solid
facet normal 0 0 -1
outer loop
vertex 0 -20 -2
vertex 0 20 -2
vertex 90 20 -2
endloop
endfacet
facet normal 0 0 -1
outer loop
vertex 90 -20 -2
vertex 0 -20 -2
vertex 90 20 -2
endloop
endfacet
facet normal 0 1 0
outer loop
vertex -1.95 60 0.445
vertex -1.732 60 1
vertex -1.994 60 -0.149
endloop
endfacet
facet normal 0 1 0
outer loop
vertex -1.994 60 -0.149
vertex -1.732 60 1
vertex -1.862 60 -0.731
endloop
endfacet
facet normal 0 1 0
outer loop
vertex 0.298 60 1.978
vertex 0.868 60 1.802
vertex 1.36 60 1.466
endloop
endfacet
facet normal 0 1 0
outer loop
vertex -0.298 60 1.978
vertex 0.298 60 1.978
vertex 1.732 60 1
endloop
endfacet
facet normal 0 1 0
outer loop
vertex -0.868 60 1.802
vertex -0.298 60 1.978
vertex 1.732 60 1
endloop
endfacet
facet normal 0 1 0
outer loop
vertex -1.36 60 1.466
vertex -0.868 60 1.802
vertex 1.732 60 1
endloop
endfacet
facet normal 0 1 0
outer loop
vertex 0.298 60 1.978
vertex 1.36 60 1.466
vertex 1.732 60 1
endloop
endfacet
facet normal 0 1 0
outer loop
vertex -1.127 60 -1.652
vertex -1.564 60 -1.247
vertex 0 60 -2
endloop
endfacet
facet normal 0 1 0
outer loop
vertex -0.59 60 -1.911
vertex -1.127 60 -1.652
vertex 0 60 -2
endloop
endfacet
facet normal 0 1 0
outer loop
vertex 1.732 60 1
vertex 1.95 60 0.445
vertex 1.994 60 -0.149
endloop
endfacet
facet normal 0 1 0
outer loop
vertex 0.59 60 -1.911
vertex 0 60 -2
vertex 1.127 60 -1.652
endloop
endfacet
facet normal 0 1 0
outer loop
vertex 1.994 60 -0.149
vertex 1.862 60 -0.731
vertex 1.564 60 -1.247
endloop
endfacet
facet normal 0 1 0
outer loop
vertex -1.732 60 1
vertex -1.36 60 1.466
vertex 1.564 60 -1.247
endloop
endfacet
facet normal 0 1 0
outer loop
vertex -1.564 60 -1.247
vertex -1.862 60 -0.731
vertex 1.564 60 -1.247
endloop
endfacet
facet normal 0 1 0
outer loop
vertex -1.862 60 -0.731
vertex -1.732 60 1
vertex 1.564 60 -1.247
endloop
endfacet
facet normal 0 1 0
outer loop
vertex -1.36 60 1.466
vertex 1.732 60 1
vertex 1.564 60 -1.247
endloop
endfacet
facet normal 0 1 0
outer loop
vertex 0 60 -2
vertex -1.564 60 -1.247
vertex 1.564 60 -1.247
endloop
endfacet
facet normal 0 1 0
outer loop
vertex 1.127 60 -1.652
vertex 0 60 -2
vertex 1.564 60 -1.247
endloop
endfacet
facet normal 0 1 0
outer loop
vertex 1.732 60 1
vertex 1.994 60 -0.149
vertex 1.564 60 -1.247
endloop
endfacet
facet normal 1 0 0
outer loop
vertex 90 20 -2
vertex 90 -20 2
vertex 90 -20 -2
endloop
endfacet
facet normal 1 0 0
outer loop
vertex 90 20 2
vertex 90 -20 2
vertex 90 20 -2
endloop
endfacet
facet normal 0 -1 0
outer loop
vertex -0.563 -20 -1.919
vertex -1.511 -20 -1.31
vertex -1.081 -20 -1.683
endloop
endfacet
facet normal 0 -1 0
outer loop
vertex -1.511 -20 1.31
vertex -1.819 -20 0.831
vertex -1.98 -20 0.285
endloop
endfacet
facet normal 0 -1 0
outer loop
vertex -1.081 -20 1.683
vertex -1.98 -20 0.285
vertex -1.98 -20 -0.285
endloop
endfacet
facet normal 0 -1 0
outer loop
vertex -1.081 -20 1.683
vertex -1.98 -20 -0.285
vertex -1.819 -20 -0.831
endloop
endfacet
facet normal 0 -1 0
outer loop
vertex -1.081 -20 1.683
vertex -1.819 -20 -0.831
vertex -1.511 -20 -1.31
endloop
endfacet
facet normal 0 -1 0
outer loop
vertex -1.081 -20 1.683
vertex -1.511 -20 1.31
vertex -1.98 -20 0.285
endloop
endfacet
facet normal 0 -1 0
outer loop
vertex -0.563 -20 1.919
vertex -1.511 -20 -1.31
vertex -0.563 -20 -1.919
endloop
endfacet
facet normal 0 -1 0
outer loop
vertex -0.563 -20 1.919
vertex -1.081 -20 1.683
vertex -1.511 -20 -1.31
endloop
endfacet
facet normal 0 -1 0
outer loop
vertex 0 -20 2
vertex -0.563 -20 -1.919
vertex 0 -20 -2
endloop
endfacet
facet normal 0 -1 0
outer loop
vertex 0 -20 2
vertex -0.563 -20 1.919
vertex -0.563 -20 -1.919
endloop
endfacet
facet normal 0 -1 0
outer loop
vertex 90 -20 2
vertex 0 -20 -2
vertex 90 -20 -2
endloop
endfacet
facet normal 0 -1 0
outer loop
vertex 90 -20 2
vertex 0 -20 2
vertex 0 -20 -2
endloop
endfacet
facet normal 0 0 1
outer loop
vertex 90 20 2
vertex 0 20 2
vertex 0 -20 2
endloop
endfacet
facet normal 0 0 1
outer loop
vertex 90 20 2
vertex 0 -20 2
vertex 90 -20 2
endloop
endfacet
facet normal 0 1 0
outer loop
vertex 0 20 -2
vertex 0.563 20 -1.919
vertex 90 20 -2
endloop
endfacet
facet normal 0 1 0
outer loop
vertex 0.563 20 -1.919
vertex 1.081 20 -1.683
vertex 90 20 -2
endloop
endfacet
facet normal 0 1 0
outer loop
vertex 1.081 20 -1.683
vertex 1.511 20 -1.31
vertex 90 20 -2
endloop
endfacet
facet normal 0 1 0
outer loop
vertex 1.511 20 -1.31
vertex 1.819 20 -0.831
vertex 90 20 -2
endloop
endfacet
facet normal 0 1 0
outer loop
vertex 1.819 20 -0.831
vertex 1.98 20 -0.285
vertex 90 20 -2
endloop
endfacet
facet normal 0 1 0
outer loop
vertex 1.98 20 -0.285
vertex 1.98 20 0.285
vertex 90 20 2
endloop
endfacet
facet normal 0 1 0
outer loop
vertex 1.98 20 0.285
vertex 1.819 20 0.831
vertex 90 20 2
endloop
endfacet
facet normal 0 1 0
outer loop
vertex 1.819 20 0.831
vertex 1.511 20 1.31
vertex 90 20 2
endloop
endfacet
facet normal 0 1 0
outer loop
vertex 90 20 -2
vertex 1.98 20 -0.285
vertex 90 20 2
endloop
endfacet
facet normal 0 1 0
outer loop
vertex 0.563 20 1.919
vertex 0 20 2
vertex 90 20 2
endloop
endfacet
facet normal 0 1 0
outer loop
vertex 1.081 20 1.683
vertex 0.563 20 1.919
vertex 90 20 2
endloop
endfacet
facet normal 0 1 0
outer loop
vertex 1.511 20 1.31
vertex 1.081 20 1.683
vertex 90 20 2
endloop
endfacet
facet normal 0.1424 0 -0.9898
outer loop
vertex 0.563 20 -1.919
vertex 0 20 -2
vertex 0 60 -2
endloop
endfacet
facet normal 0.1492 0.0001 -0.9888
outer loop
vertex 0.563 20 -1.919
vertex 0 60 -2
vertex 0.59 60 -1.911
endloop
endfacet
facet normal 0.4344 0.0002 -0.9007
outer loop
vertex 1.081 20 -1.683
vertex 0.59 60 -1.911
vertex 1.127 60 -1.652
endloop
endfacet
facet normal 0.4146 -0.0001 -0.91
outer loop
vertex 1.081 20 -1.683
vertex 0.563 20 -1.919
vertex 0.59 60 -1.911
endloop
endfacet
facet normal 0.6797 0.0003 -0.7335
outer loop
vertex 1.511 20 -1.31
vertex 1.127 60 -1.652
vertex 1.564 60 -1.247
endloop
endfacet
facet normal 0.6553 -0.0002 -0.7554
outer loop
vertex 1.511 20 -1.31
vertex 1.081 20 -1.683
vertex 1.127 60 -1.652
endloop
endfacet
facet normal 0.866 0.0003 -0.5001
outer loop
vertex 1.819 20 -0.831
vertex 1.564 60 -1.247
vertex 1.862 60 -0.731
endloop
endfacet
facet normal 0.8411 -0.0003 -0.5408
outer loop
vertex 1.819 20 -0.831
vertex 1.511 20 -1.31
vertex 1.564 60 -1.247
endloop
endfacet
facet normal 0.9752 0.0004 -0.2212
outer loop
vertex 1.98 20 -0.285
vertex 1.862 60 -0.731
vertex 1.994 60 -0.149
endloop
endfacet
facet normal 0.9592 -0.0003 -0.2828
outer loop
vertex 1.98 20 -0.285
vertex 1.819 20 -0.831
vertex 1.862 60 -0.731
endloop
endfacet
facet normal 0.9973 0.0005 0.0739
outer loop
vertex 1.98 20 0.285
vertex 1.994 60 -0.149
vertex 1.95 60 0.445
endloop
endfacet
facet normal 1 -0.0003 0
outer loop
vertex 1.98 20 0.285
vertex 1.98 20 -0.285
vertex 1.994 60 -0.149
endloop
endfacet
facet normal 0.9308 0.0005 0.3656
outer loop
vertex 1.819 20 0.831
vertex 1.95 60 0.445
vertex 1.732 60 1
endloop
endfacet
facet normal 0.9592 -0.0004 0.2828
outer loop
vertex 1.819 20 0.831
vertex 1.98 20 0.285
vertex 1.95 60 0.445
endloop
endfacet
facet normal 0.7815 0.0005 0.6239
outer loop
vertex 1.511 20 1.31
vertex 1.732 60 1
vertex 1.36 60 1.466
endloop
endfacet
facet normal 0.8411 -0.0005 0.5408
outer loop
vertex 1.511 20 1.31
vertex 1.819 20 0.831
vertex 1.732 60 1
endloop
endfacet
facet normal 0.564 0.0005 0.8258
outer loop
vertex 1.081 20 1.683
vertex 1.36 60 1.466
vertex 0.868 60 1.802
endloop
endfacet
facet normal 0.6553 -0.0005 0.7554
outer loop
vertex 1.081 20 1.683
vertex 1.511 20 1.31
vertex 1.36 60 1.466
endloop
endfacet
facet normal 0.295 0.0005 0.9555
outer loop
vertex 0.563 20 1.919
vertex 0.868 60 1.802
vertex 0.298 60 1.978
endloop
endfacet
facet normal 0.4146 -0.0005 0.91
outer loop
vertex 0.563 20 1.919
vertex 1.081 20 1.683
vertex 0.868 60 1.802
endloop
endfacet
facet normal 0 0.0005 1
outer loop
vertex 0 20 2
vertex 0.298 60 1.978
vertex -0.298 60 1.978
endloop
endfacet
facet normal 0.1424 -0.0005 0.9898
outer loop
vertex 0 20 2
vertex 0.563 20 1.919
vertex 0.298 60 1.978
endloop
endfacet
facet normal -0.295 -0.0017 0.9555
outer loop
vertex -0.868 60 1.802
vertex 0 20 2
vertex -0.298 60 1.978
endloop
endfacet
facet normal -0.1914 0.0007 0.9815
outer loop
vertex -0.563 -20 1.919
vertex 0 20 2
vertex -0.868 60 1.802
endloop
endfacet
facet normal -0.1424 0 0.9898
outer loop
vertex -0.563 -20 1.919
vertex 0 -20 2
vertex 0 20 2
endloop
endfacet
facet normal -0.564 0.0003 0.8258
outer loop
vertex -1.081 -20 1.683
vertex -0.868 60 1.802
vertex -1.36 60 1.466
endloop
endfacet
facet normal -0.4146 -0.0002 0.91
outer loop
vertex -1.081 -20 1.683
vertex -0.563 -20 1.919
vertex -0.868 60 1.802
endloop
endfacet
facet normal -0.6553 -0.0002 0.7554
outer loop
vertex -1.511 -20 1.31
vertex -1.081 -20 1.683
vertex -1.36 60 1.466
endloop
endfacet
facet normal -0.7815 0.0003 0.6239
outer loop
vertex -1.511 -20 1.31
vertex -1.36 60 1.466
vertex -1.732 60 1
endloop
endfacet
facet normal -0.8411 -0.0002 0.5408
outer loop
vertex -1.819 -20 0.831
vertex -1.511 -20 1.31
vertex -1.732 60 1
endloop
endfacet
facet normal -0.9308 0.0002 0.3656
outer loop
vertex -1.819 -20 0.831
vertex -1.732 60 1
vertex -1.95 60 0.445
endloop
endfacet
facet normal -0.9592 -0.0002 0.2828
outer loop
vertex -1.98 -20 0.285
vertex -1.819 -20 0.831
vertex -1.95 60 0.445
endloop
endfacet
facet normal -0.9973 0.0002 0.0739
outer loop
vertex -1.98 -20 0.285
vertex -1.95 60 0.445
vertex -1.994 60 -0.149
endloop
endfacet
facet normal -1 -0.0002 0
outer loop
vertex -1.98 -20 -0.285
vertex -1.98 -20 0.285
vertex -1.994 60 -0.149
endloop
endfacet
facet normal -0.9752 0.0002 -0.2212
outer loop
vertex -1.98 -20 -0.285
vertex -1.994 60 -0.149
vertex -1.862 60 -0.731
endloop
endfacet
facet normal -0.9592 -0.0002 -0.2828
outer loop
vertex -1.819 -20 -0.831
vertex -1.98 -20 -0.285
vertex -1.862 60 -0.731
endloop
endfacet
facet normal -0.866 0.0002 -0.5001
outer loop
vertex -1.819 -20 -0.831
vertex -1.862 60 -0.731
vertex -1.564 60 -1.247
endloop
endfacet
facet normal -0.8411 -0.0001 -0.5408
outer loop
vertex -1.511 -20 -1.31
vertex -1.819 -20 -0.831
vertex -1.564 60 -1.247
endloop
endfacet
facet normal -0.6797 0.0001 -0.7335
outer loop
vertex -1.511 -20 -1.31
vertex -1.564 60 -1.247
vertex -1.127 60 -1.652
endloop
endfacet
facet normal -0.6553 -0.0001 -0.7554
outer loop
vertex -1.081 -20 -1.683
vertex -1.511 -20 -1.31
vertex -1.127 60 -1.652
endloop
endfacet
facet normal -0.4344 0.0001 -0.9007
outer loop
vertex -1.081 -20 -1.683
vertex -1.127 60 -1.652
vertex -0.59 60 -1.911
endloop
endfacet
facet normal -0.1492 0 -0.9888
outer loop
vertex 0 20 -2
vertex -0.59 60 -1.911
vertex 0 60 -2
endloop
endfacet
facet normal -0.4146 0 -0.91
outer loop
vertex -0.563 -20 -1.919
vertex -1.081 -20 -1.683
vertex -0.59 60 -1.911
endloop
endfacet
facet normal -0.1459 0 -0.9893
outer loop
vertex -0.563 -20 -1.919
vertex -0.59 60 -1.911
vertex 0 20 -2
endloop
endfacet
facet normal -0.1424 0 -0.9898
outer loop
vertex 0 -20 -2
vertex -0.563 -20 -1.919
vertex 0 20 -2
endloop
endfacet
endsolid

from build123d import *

# Parameters (mm, degrees)
SKETCH1_W           = 90
SKETCH1_H           = 40
BOSS_EXTRUDE1_DEPTH = 2
SKETCH4_R           = 2
BOSS_EXTRUDE2_DEPTH = 80


with BuildPart() as part:
    # Sketch1 → Boss-Extrude1 (new, symmetric)
    with BuildSketch(Plane.XY):
        with Locations((45, 0)):
            Rectangle(SKETCH1_W, SKETCH1_H)
    extrude(amount=BOSS_EXTRUDE1_DEPTH, both=True)

    # Sketch4 → Boss-Extrude2 (add)
    with BuildSketch(Plane.XZ.offset(20)):
        with Locations(Location((0, 0, 0), (0, 0, 270))):
            Circle(SKETCH4_R)
    extrude(amount=-BOSS_EXTRUDE2_DEPTH)


solid = part.part
